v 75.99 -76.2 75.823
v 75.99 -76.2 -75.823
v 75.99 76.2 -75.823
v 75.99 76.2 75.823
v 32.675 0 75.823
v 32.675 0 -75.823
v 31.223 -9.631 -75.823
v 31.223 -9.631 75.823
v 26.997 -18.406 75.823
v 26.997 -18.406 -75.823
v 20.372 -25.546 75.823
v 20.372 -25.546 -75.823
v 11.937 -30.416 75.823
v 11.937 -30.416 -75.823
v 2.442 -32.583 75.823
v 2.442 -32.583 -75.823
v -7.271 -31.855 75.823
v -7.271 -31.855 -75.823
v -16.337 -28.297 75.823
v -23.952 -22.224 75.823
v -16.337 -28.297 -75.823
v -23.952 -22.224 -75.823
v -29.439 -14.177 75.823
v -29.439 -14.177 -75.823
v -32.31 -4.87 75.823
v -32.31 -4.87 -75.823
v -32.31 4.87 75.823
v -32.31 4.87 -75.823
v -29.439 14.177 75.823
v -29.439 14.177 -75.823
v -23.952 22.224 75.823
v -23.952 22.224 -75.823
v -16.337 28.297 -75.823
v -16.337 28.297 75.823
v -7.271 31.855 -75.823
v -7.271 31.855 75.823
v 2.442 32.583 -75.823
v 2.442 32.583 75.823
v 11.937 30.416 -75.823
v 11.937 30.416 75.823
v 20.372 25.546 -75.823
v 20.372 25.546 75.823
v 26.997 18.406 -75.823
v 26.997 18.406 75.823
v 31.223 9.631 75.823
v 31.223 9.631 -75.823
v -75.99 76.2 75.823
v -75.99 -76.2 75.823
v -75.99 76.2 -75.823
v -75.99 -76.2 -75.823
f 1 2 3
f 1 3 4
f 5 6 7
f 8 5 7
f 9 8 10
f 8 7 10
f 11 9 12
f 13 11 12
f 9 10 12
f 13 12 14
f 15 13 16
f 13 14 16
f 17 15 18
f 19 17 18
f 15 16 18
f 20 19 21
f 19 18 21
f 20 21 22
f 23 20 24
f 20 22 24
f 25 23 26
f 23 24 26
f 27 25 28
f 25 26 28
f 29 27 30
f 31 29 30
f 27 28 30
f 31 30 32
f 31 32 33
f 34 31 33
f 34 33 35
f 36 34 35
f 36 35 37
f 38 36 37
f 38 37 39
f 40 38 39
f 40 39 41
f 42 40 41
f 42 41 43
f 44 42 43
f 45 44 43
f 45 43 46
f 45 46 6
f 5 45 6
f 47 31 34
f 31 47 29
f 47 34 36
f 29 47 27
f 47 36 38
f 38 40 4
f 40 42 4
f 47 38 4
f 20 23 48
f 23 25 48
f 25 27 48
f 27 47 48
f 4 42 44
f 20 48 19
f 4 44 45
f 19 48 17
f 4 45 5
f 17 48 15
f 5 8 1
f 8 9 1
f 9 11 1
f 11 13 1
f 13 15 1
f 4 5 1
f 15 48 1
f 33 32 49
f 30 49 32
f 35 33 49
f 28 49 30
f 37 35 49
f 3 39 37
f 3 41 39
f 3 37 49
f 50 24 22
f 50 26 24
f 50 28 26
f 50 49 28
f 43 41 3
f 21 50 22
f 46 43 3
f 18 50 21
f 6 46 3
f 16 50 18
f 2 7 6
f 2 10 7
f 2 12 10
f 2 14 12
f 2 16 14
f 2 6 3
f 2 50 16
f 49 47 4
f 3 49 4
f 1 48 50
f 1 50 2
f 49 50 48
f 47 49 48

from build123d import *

# Parameters (mm, degrees)
F0_W     = 151.980818
F0_H     = 151.646004
F1_DEPTH = 76.2
F2_R     = 32.674685
F3_DEPTH = 151.647003


with BuildPart() as f1:
    # F0 (on Front) → F1 (new body, symmetric)
    with BuildSketch(Plane.XZ):
        Rectangle(F0_W, F0_H)
    extrude(amount=F1_DEPTH, both=True)

    # F2 (on face) → F3 (cut, through all)
    with BuildSketch(Plane(origin=(0, 0, -75.823002), x_dir=(1, 0, 0), z_dir=(0, 0, -1))):
        Circle(F2_R)
    extrude(amount=-F3_DEPTH, mode=Mode.SUBTRACT)


solid = f1.part
